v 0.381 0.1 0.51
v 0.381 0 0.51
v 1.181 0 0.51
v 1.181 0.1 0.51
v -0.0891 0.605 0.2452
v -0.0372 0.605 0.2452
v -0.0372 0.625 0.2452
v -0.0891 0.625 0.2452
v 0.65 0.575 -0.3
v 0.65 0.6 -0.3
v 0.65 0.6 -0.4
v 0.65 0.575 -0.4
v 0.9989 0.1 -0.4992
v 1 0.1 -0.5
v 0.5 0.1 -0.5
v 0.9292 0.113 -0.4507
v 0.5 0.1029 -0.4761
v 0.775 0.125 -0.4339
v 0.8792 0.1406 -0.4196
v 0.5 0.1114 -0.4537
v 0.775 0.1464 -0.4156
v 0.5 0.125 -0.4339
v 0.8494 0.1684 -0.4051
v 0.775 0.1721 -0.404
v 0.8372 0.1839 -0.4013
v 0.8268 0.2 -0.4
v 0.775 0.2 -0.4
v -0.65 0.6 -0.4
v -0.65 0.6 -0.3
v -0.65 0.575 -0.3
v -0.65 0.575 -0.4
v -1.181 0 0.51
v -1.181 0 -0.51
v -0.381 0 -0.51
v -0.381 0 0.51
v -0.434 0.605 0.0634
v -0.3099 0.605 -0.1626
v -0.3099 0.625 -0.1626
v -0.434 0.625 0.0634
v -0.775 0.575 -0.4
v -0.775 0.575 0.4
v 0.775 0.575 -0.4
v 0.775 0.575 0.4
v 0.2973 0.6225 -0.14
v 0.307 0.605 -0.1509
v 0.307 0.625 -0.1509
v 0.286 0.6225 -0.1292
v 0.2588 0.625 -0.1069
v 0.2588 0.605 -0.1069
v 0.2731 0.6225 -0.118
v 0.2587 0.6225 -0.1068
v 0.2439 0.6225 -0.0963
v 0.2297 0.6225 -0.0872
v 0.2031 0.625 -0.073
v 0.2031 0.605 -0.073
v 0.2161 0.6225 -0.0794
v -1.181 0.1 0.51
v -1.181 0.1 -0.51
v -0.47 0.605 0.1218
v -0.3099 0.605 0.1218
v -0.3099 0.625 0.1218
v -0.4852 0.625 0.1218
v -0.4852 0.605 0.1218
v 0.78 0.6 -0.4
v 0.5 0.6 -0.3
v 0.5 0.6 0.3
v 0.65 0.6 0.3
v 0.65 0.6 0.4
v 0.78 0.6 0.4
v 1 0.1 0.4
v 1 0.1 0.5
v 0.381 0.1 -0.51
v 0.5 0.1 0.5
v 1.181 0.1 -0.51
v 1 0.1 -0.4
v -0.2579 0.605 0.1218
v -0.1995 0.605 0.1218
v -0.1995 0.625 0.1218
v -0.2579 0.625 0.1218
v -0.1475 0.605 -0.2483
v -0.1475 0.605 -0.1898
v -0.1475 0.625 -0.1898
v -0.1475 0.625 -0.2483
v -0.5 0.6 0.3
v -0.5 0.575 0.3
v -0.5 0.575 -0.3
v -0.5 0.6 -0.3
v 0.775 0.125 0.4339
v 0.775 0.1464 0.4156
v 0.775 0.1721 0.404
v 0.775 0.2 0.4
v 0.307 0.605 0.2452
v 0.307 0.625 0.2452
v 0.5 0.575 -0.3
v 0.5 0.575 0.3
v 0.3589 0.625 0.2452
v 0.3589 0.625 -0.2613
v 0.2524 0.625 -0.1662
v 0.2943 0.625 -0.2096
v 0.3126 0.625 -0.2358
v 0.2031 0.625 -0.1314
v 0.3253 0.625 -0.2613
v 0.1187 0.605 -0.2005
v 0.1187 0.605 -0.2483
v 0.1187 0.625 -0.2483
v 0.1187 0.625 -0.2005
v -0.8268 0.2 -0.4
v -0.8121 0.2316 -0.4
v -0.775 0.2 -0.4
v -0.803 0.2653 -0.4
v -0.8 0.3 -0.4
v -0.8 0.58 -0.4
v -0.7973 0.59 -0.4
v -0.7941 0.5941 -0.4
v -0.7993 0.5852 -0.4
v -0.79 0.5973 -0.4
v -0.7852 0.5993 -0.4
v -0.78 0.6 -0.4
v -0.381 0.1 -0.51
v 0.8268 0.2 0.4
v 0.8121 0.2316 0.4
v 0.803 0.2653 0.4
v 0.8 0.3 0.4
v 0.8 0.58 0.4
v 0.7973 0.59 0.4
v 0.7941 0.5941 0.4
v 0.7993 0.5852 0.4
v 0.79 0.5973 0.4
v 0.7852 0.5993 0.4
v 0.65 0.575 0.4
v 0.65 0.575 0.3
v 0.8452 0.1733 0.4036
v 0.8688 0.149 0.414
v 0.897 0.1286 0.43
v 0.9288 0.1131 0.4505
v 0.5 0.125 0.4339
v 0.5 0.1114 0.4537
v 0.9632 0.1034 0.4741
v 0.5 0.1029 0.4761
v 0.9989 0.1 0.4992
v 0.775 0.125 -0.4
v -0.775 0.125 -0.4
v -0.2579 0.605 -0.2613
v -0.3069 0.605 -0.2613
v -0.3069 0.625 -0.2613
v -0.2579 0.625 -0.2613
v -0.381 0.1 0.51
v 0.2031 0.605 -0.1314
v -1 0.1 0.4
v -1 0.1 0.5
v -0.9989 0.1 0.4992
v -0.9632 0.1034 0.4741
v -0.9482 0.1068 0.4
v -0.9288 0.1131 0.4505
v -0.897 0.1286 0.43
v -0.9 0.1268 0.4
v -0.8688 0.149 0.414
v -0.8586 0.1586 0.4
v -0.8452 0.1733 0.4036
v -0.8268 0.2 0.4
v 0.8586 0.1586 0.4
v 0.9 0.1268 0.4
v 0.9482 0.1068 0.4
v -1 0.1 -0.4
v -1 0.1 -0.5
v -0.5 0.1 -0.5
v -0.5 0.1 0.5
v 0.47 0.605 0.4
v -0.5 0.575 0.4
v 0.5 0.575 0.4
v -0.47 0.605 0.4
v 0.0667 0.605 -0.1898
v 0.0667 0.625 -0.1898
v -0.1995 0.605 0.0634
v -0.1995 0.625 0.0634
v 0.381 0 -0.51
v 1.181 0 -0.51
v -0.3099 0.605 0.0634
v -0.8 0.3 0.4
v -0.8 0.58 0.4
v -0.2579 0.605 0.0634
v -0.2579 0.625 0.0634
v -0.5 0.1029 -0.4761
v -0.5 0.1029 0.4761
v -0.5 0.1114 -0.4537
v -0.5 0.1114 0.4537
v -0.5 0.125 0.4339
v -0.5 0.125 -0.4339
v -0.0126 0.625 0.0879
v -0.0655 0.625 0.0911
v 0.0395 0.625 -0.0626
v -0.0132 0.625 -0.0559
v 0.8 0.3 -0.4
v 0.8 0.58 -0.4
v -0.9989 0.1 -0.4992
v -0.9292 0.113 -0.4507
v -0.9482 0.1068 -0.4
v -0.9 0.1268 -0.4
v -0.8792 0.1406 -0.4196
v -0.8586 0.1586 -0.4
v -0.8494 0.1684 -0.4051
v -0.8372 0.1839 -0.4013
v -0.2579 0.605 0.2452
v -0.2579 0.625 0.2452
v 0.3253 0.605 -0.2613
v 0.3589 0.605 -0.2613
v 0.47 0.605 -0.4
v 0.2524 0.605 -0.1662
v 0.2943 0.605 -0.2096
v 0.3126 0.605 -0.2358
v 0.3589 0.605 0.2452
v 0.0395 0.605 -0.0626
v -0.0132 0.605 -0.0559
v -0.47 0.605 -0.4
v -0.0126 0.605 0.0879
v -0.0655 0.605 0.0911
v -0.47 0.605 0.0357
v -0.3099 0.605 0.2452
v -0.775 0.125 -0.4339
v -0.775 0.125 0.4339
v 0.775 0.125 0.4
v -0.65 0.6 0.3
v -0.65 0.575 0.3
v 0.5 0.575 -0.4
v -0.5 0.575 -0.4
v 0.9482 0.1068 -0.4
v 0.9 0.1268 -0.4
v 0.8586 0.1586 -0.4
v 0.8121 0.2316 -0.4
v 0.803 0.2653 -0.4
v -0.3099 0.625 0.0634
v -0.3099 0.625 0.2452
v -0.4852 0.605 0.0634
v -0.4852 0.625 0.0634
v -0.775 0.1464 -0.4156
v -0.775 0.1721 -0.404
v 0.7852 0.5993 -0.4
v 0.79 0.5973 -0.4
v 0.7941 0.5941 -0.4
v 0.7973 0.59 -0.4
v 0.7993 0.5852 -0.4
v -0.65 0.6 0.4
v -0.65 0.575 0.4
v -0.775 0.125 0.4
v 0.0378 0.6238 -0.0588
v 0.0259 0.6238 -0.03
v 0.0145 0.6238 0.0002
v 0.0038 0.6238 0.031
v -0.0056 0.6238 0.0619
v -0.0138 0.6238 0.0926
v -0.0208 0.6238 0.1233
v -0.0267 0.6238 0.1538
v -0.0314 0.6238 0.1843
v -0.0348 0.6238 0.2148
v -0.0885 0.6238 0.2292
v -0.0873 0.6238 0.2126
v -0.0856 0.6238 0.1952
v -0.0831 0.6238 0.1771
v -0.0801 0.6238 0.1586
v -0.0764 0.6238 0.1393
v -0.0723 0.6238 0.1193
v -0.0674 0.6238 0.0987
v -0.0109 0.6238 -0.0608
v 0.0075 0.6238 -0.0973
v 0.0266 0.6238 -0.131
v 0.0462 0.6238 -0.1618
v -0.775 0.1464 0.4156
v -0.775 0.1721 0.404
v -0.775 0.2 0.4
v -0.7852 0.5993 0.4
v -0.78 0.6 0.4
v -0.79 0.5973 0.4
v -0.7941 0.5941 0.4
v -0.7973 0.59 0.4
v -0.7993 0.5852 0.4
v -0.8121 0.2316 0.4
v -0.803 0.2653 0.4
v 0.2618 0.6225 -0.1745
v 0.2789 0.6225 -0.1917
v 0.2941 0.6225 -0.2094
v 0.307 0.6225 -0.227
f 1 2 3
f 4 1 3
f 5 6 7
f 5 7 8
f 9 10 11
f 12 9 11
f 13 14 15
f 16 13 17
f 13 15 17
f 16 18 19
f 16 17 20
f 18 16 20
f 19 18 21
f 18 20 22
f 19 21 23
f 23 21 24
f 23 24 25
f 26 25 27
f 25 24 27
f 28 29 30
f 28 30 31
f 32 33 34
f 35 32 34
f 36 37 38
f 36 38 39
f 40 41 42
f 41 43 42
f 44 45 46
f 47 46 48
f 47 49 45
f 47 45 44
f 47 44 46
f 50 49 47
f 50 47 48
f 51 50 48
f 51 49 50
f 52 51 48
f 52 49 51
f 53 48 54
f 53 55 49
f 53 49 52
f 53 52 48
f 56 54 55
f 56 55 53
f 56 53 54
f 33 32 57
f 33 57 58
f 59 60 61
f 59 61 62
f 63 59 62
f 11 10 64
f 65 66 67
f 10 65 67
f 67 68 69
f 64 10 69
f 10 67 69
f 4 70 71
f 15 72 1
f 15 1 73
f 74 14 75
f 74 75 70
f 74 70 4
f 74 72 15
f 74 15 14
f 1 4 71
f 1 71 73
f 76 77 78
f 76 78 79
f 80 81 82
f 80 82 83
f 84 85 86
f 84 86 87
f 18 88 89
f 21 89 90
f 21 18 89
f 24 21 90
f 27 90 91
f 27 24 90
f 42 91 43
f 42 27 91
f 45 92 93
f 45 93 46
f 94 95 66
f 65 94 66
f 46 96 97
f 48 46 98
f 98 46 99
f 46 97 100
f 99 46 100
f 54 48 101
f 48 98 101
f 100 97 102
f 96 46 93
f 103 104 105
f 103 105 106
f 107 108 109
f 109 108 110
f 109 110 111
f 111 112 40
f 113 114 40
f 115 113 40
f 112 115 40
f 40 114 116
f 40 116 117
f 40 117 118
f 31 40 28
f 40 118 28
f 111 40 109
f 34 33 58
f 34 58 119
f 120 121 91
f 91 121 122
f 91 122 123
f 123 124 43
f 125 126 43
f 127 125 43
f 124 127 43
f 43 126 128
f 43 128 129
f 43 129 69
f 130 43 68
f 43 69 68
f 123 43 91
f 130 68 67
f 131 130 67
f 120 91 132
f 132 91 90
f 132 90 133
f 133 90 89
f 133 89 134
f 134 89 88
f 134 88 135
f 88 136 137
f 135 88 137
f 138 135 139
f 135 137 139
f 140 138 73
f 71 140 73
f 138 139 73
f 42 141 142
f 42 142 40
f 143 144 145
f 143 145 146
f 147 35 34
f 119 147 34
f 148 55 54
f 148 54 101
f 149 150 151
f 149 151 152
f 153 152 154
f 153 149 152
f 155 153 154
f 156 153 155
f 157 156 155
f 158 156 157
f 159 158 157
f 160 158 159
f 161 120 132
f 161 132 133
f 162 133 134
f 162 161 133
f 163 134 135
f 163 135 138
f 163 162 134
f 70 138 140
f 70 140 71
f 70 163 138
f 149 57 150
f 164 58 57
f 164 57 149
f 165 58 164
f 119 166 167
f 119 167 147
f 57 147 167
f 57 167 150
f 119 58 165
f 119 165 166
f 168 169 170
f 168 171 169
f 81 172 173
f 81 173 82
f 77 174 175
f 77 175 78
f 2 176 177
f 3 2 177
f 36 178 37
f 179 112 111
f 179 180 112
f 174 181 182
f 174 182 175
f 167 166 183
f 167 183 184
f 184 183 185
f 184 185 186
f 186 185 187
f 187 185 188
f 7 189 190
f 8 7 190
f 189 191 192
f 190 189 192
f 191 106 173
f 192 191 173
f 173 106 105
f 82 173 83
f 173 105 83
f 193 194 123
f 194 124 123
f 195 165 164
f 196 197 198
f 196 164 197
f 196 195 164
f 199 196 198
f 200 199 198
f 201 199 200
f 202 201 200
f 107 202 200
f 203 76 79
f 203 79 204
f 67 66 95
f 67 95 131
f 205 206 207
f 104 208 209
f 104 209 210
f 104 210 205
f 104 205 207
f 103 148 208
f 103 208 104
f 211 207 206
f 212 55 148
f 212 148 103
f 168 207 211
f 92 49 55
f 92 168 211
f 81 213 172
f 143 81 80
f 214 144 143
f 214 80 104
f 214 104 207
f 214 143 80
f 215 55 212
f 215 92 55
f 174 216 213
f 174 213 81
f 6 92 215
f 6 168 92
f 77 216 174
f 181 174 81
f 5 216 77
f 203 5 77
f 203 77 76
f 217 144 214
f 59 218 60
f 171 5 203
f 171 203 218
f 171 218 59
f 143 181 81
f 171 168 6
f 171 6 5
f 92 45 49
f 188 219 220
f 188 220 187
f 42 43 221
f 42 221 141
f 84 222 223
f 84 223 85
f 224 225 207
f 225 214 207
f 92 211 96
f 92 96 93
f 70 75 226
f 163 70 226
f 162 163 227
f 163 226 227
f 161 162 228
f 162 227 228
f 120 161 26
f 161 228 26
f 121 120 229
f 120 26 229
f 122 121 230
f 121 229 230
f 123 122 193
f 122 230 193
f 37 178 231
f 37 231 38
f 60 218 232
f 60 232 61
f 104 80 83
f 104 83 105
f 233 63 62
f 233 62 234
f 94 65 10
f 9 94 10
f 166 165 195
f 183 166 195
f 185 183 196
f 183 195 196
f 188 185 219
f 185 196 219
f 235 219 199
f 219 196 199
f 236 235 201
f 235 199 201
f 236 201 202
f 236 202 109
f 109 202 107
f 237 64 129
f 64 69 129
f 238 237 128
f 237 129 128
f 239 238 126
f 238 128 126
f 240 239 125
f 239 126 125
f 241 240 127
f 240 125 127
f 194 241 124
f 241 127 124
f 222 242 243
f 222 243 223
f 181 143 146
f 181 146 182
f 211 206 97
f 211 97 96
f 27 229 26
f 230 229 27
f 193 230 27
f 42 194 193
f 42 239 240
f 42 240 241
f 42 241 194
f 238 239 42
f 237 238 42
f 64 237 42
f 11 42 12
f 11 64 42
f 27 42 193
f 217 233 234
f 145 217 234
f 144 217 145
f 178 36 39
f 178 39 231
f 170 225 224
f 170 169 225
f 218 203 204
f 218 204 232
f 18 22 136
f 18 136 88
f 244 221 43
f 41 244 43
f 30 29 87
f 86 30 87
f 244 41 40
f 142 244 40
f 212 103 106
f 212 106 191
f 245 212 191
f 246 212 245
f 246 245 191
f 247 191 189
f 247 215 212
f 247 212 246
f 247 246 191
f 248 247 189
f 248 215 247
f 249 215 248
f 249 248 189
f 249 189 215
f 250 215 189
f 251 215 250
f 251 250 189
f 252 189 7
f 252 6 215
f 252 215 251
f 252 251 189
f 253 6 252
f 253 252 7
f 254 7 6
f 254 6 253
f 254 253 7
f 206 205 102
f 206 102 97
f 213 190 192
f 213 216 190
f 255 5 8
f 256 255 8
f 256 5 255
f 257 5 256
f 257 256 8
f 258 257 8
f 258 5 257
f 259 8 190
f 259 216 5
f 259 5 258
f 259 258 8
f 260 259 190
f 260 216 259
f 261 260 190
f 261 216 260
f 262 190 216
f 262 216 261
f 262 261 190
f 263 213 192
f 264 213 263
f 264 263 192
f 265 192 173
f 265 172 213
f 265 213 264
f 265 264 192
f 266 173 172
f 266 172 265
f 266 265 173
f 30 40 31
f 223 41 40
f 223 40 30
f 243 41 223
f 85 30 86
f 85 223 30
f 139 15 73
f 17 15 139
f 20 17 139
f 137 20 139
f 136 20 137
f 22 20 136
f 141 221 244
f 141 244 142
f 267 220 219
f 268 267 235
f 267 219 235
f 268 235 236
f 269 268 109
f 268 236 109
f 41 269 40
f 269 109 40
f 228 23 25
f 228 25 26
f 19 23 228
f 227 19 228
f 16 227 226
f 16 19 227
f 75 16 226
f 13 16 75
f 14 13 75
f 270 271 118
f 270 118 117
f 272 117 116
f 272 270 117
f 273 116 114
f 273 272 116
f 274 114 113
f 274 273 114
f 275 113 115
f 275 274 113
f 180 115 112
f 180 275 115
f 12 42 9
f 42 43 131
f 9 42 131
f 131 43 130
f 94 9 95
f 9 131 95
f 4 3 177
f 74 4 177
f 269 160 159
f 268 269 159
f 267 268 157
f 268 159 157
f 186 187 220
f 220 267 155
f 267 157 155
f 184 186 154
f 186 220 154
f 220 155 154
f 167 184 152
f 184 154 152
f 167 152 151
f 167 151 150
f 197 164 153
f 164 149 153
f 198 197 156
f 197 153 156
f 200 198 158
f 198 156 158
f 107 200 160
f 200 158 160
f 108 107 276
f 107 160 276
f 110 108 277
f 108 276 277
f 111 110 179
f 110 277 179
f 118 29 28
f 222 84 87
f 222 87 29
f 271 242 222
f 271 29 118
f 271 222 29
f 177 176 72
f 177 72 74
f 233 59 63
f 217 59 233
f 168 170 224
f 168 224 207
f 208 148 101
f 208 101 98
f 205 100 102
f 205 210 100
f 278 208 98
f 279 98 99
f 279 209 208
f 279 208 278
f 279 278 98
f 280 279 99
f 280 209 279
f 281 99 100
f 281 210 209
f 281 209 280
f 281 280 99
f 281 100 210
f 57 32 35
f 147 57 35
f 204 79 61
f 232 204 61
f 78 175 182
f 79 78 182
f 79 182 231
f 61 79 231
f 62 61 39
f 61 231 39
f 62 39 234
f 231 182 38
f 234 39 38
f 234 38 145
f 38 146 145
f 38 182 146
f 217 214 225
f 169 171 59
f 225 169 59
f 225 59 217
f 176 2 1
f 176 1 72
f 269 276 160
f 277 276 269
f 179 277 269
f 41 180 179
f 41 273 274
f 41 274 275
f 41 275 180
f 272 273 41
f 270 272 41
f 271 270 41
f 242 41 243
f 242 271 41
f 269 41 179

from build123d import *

# Parameters (mm, degrees)
SKETCH1_W             = 0.8
SKETCH1_H             = 0.45
BOSS_EXTRUDE1_DEPTH   = 0.775
BOSS_EXTRUDE2_DEPTH   = 0.4
BOSS_EXTRUDE2_2_DEPTH = 0.4
SKETCH3_W             = 0.15
SKETCH3_H             = 0.1
CUT_EXTRUDE1_DEPTH    = 0.025
BOSS_EXTRUDE3_DEPTH   = 0.4
SKETCH7_W             = 0.8
SKETCH7_H             = 1.02
BOSS_EXTRUDE5_DEPTH   = 0.1
FILLET3_R             = 0.2
FILLET4_R             = 0.2
FILLET5_R             = 0.1
FILLET6_R             = 0.1
BOSS_EXTRU_1_DEPTH    = 0.02


with BuildPart() as part:
    # Sketch1 → Boss-Extrude1 (new, symmetric)
    with BuildSketch(Plane(origin=(0, 0, 0), x_dir=(0, 0, -1), z_dir=(1, 0, 0))):
        with Locations((0, 0.35)):
            Rectangle(SKETCH1_W, SKETCH1_H)
    extrude(amount=BOSS_EXTRUDE1_DEPTH, both=True)


with BuildPart() as body_2:
    # Sketch2 → Boss-Extrude2 (new, symmetric)
    with BuildSketch(Plane.XY):
        with BuildLine():
            Line((-0.5, 0.6), (-0.78, 0.6))
            ThreePointArc((-0.78, 0.6), (-0.794142136, 0.594142136), (-0.8, 0.58))
            Line((-0.8, 0.58), (-0.8, 0.1))
            Line((-0.8, 0.1), (-0.5, 0.1))
            Line((-0.5, 0.1), (-0.5, 0.125))
            Line((-0.5, 0.125), (-0.775, 0.125))
            Line((-0.775, 0.125), (-0.775, 0.575))
            Line((-0.775, 0.575), (-0.5, 0.575))
            Line((-0.5, 0.575), (-0.5, 0.6))
        make_face()
    extrude(amount=BOSS_EXTRUDE2_DEPTH, both=True)


with BuildPart() as body_3:
    # Sketch2 → Boss-Extrude2 2 (new, symmetric)
    with BuildSketch(Plane.XY):
        with BuildLine():
            Line((0.5, 0.575), (0.5, 0.6))
            Line((0.5, 0.6), (0.78, 0.6))
            ThreePointArc((0.78, 0.6), (0.794142136, 0.594142136), (0.8, 0.58))
            Line((0.8, 0.58), (0.8, 0.1))
            Line((0.8, 0.1), (0.5, 0.1))
            Line((0.5, 0.1), (0.5, 0.125))
            Line((0.5, 0.125), (0.775, 0.125))
            Line((0.775, 0.125), (0.775, 0.575))
            Line((0.775, 0.575), (0.5, 0.575))
        make_face()
    extrude(amount=BOSS_EXTRUDE2_2_DEPTH, both=True)


with BuildPart() as cut_extrude1_tool:
    # Sketch3 → Cut-Extrude1 (new body)
    with BuildSketch(Plane(origin=(0, 0.6, 0), x_dir=(1, 0, 0), z_dir=(0, 1, 0))):
        with Locations((-0.575, 0.35)):
            Rectangle(SKETCH3_W, SKETCH3_H)
        with Locations((-0.575, -0.35)):
            Rectangle(SKETCH3_W, SKETCH3_H)
        with Locations((0.575, -0.35)):
            Rectangle(SKETCH3_W, SKETCH3_H)
        with Locations((0.575, 0.35)):
            Rectangle(SKETCH3_W, SKETCH3_H)
    extrude(amount=-CUT_EXTRUDE1_DEPTH)


with BuildPart() as body_2_1:
    add(body_2.part)

    # Cut-Extrude1: cut by cut_extrude1_tool
    add(cut_extrude1_tool.part, mode=Mode.SUBTRACT)



with BuildPart() as body_3_1:
    add(body_3.part)

    # Cut-Extrude1: cut by cut_extrude1_tool
    add(cut_extrude1_tool.part, mode=Mode.SUBTRACT)


with BuildPart() as body_4:
    # Sketch4 → Boss-Extrude3 (new, symmetric)
    with BuildSketch(Plane.XY):
        Polygon((-0.5, 0.575), (0.5, 0.575), (0.47, 0.605), (-0.47, 0.605), align=None)
    extrude(amount=BOSS_EXTRUDE3_DEPTH, both=True)

    # Esquisse2 → Boss.-Extru.1 (add)
    # profile 1 of 3: a face of its own
    with BuildSketch(Plane(origin=(0, 0.605, 0), x_dir=(1, 0, 0), z_dir=(0, 1, 0))):
        Polygon((-0.309886691, -0.245221888), (-0.309886691, -0.121845264), (-0.485211367, -0.121845264), (-0.485211367, -0.063403706), (-0.306944321, 0.261271619), (-0.257938639, 0.261271619), (-0.257938639, -0.063403706), (-0.199497081, -0.063403706), (-0.199497081, -0.121845264), (-0.257938639, -0.121845264), (-0.257938639, -0.245221888), align=None)
        Polygon((-0.309886691, -0.063403706), (-0.309886691, 0.162550028), (-0.433973542, -0.063403706), align=None, mode=Mode.SUBTRACT)
    # profile 2 of 3: a face of its own
    with BuildSketch(Plane(origin=(0, 0.605, 0), x_dir=(1, 0, 0), z_dir=(0, 1, 0))):
        with BuildLine():
            Line((-0.147549029, 0.189843048), (-0.147549029, 0.248284606))
            Line((-0.147549029, 0.248284606), (0.118684737, 0.248284606))
            Line((0.118684737, 0.248284606), (0.118684737, 0.200496457))
            add(Edge.make_bspline(
                [(0.118684737, 0.200496457), (0.11374506, 0.193883112), (0.103690577, 0.180421956), (0.089629665, 0.15888939), (0.075954824, 0.135956865), (0.062653235, 0.111604996), (0.049881166, 0.085755524), (0.037509723, 0.058489528), (0.02565439, 0.029704454), (0.014307924, -0.000233926), (0.003675417, -0.030854621), (-0.005742033, -0.061692329), (-0.013988634, -0.092449334), (-0.020962495, -0.123124227), (-0.026905964, -0.153701204), (-0.031550699, -0.184233606), (-0.035053075, -0.21472856), (-0.036458112, -0.235069144), (-0.037159418, -0.245221888)],
                knots=[0, 0, 0, 0, 0.828235292, 1.685834407, 2.579347319, 3.50739146, 4.469751317, 5.472290501, 6.511687755, 7.593421113, 8.685056077, 9.764080991, 10.828622054, 11.880069368, 12.920502423, 13.954003105, 14.978766756, 16, 16, 16, 16], degree=3))
            Line((-0.037159418, -0.245221888), (-0.08910747, -0.245221888))
            add(Edge.make_bspline(
                [(-0.08910747, -0.245221888), (-0.088946966, -0.239876054), (-0.088619538, -0.228970553), (-0.087305949, -0.2122975), (-0.085650055, -0.194926574), (-0.083168557, -0.176934464), (-0.080118357, -0.158294079), (-0.076411626, -0.13902896), (-0.072322113, -0.11904052), (-0.065773685, -0.091649168), (-0.056543919, -0.057339348), (-0.043279746, -0.016938754), (-0.028326509, 0.022538381), (-0.011308019, 0.060586243), (0.006839864, 0.096834643), (0.025951357, 0.13052881), (0.045471344, 0.161610603), (0.059774471, 0.180599823), (0.066736685, 0.189843048)],
                knots=[0, 0, 0, 0, 0.54755489, 1.117011975, 1.712111195, 2.334110413, 2.976306168, 3.645990646, 4.342828197, 5.06521062, 6.529487471, 7.979439287, 9.417531512, 10.850025522, 12.245424871, 13.566691952, 14.815558909, 16, 16, 16, 16], degree=3))
            Line((0.066736685, 0.189843048), (-0.147549029, 0.189843048))
        make_face()
    # profile 3 of 3: a face of its own
    with BuildSketch(Plane(origin=(0, 0.605, 0), x_dir=(1, 0, 0), z_dir=(0, 1, 0))):
        with BuildLine():
            Line((0.358944478, -0.245221888), (0.306996426, -0.245221888))
            Line((0.306996426, -0.245221888), (0.306996426, 0.150882009))
            add(Edge.make_bspline(
                [(0.306996426, 0.150882009), (0.303806106, 0.147209677), (0.297194172, 0.139598774), (0.285716194, 0.128775009), (0.272925255, 0.1176135), (0.258763988, 0.106782892), (0.244334784, 0.096408923), (0.230083263, 0.087284837), (0.216543567, 0.079346193), (0.207460341, 0.075031174), (0.203100322, 0.072959931)],
                knots=[0, 0, 0, 0, 0.892555828, 1.849821039, 2.893015883, 4.008277588, 5.121255548, 6.154629642, 7.114207698, 8, 8, 8, 8], degree=3))
            Line((0.203100322, 0.072959931), (0.203100322, 0.131401489))
            add(Edge.make_bspline(
                [(0.203100322, 0.131401489), (0.210107225, 0.13561851), (0.224061033, 0.144016443), (0.243612145, 0.158564375), (0.262081827, 0.174266475), (0.278918027, 0.191287267), (0.293992994, 0.208833156), (0.306932185, 0.226343975), (0.317541502, 0.243633673), (0.322745711, 0.255526991), (0.325259413, 0.261271619)],
                knots=[0, 0, 0, 0, 1.082272232, 2.155277244, 3.222407096, 4.289527553, 5.32168536, 6.282742408, 7.170542132, 8, 8, 8, 8], degree=3))
            Line((0.325259413, 0.261271619), (0.358944478, 0.261271619))
            Line((0.358944478, 0.261271619), (0.358944478, -0.245221888))
        make_face()
    extrude(amount=BOSS_EXTRU_1_DEPTH)


with BuildPart() as body_2_2:
    add(body_2_1.part)

    add(body_3_1.part)  # Boss-Extrude5 merges body 3
    # Sketch7 → Boss-Extrude5 (add)
    with BuildSketch(Plane(origin=(0, 0, 0), x_dir=(1, 0, 0), z_dir=(0, 1, 0))):
        with Locations((-0.781, 0)):
            Rectangle(SKETCH7_W, SKETCH7_H)
        with Locations((0.781, 0)):
            Rectangle(SKETCH7_W, SKETCH7_H)
    extrude(amount=BOSS_EXTRUDE5_DEPTH)

    # Fillet3
    fillet3_edges = [body_2_2.edges().sort_by_distance(p)[0] for p in [
        (-0.8, 0.1, 0),
    ]]
    fillet(fillet3_edges, radius=FILLET3_R)

    # Fillet4
    fillet4_edges = [body_2_2.edges().sort_by_distance(p)[0] for p in [
        (0.8, 0.1, 0),
    ]]
    fillet(fillet4_edges, radius=FILLET4_R)

    # Fillet5
    fillet5_edges = [body_2_2.edges().sort_by_distance(p)[0] for p in [
        (0.75, 0.1, 0.4),
    ]]
    fillet(fillet5_edges, radius=FILLET5_R)
    fillet5_2_edges = [body_2_2.edges().sort_by_distance(p)[0] for p in [
        (0.75, 0.1, -0.4),
    ]]
    fillet(fillet5_2_edges, radius=FILLET5_R)

    # Fillet6
    fillet6_edges = [body_2_2.edges().sort_by_distance(p)[0] for p in [
        (-0.75, 0.1, -0.4),
    ]]
    fillet(fillet6_edges, radius=FILLET6_R)
    fillet6_2_edges = [body_2_2.edges().sort_by_distance(p)[0] for p in [
        (-0.75, 0.1, 0.4),
    ]]
    fillet(fillet6_2_edges, radius=FILLET6_R)


solid = Compound([part.part, body_4.part, body_2_2.part])
